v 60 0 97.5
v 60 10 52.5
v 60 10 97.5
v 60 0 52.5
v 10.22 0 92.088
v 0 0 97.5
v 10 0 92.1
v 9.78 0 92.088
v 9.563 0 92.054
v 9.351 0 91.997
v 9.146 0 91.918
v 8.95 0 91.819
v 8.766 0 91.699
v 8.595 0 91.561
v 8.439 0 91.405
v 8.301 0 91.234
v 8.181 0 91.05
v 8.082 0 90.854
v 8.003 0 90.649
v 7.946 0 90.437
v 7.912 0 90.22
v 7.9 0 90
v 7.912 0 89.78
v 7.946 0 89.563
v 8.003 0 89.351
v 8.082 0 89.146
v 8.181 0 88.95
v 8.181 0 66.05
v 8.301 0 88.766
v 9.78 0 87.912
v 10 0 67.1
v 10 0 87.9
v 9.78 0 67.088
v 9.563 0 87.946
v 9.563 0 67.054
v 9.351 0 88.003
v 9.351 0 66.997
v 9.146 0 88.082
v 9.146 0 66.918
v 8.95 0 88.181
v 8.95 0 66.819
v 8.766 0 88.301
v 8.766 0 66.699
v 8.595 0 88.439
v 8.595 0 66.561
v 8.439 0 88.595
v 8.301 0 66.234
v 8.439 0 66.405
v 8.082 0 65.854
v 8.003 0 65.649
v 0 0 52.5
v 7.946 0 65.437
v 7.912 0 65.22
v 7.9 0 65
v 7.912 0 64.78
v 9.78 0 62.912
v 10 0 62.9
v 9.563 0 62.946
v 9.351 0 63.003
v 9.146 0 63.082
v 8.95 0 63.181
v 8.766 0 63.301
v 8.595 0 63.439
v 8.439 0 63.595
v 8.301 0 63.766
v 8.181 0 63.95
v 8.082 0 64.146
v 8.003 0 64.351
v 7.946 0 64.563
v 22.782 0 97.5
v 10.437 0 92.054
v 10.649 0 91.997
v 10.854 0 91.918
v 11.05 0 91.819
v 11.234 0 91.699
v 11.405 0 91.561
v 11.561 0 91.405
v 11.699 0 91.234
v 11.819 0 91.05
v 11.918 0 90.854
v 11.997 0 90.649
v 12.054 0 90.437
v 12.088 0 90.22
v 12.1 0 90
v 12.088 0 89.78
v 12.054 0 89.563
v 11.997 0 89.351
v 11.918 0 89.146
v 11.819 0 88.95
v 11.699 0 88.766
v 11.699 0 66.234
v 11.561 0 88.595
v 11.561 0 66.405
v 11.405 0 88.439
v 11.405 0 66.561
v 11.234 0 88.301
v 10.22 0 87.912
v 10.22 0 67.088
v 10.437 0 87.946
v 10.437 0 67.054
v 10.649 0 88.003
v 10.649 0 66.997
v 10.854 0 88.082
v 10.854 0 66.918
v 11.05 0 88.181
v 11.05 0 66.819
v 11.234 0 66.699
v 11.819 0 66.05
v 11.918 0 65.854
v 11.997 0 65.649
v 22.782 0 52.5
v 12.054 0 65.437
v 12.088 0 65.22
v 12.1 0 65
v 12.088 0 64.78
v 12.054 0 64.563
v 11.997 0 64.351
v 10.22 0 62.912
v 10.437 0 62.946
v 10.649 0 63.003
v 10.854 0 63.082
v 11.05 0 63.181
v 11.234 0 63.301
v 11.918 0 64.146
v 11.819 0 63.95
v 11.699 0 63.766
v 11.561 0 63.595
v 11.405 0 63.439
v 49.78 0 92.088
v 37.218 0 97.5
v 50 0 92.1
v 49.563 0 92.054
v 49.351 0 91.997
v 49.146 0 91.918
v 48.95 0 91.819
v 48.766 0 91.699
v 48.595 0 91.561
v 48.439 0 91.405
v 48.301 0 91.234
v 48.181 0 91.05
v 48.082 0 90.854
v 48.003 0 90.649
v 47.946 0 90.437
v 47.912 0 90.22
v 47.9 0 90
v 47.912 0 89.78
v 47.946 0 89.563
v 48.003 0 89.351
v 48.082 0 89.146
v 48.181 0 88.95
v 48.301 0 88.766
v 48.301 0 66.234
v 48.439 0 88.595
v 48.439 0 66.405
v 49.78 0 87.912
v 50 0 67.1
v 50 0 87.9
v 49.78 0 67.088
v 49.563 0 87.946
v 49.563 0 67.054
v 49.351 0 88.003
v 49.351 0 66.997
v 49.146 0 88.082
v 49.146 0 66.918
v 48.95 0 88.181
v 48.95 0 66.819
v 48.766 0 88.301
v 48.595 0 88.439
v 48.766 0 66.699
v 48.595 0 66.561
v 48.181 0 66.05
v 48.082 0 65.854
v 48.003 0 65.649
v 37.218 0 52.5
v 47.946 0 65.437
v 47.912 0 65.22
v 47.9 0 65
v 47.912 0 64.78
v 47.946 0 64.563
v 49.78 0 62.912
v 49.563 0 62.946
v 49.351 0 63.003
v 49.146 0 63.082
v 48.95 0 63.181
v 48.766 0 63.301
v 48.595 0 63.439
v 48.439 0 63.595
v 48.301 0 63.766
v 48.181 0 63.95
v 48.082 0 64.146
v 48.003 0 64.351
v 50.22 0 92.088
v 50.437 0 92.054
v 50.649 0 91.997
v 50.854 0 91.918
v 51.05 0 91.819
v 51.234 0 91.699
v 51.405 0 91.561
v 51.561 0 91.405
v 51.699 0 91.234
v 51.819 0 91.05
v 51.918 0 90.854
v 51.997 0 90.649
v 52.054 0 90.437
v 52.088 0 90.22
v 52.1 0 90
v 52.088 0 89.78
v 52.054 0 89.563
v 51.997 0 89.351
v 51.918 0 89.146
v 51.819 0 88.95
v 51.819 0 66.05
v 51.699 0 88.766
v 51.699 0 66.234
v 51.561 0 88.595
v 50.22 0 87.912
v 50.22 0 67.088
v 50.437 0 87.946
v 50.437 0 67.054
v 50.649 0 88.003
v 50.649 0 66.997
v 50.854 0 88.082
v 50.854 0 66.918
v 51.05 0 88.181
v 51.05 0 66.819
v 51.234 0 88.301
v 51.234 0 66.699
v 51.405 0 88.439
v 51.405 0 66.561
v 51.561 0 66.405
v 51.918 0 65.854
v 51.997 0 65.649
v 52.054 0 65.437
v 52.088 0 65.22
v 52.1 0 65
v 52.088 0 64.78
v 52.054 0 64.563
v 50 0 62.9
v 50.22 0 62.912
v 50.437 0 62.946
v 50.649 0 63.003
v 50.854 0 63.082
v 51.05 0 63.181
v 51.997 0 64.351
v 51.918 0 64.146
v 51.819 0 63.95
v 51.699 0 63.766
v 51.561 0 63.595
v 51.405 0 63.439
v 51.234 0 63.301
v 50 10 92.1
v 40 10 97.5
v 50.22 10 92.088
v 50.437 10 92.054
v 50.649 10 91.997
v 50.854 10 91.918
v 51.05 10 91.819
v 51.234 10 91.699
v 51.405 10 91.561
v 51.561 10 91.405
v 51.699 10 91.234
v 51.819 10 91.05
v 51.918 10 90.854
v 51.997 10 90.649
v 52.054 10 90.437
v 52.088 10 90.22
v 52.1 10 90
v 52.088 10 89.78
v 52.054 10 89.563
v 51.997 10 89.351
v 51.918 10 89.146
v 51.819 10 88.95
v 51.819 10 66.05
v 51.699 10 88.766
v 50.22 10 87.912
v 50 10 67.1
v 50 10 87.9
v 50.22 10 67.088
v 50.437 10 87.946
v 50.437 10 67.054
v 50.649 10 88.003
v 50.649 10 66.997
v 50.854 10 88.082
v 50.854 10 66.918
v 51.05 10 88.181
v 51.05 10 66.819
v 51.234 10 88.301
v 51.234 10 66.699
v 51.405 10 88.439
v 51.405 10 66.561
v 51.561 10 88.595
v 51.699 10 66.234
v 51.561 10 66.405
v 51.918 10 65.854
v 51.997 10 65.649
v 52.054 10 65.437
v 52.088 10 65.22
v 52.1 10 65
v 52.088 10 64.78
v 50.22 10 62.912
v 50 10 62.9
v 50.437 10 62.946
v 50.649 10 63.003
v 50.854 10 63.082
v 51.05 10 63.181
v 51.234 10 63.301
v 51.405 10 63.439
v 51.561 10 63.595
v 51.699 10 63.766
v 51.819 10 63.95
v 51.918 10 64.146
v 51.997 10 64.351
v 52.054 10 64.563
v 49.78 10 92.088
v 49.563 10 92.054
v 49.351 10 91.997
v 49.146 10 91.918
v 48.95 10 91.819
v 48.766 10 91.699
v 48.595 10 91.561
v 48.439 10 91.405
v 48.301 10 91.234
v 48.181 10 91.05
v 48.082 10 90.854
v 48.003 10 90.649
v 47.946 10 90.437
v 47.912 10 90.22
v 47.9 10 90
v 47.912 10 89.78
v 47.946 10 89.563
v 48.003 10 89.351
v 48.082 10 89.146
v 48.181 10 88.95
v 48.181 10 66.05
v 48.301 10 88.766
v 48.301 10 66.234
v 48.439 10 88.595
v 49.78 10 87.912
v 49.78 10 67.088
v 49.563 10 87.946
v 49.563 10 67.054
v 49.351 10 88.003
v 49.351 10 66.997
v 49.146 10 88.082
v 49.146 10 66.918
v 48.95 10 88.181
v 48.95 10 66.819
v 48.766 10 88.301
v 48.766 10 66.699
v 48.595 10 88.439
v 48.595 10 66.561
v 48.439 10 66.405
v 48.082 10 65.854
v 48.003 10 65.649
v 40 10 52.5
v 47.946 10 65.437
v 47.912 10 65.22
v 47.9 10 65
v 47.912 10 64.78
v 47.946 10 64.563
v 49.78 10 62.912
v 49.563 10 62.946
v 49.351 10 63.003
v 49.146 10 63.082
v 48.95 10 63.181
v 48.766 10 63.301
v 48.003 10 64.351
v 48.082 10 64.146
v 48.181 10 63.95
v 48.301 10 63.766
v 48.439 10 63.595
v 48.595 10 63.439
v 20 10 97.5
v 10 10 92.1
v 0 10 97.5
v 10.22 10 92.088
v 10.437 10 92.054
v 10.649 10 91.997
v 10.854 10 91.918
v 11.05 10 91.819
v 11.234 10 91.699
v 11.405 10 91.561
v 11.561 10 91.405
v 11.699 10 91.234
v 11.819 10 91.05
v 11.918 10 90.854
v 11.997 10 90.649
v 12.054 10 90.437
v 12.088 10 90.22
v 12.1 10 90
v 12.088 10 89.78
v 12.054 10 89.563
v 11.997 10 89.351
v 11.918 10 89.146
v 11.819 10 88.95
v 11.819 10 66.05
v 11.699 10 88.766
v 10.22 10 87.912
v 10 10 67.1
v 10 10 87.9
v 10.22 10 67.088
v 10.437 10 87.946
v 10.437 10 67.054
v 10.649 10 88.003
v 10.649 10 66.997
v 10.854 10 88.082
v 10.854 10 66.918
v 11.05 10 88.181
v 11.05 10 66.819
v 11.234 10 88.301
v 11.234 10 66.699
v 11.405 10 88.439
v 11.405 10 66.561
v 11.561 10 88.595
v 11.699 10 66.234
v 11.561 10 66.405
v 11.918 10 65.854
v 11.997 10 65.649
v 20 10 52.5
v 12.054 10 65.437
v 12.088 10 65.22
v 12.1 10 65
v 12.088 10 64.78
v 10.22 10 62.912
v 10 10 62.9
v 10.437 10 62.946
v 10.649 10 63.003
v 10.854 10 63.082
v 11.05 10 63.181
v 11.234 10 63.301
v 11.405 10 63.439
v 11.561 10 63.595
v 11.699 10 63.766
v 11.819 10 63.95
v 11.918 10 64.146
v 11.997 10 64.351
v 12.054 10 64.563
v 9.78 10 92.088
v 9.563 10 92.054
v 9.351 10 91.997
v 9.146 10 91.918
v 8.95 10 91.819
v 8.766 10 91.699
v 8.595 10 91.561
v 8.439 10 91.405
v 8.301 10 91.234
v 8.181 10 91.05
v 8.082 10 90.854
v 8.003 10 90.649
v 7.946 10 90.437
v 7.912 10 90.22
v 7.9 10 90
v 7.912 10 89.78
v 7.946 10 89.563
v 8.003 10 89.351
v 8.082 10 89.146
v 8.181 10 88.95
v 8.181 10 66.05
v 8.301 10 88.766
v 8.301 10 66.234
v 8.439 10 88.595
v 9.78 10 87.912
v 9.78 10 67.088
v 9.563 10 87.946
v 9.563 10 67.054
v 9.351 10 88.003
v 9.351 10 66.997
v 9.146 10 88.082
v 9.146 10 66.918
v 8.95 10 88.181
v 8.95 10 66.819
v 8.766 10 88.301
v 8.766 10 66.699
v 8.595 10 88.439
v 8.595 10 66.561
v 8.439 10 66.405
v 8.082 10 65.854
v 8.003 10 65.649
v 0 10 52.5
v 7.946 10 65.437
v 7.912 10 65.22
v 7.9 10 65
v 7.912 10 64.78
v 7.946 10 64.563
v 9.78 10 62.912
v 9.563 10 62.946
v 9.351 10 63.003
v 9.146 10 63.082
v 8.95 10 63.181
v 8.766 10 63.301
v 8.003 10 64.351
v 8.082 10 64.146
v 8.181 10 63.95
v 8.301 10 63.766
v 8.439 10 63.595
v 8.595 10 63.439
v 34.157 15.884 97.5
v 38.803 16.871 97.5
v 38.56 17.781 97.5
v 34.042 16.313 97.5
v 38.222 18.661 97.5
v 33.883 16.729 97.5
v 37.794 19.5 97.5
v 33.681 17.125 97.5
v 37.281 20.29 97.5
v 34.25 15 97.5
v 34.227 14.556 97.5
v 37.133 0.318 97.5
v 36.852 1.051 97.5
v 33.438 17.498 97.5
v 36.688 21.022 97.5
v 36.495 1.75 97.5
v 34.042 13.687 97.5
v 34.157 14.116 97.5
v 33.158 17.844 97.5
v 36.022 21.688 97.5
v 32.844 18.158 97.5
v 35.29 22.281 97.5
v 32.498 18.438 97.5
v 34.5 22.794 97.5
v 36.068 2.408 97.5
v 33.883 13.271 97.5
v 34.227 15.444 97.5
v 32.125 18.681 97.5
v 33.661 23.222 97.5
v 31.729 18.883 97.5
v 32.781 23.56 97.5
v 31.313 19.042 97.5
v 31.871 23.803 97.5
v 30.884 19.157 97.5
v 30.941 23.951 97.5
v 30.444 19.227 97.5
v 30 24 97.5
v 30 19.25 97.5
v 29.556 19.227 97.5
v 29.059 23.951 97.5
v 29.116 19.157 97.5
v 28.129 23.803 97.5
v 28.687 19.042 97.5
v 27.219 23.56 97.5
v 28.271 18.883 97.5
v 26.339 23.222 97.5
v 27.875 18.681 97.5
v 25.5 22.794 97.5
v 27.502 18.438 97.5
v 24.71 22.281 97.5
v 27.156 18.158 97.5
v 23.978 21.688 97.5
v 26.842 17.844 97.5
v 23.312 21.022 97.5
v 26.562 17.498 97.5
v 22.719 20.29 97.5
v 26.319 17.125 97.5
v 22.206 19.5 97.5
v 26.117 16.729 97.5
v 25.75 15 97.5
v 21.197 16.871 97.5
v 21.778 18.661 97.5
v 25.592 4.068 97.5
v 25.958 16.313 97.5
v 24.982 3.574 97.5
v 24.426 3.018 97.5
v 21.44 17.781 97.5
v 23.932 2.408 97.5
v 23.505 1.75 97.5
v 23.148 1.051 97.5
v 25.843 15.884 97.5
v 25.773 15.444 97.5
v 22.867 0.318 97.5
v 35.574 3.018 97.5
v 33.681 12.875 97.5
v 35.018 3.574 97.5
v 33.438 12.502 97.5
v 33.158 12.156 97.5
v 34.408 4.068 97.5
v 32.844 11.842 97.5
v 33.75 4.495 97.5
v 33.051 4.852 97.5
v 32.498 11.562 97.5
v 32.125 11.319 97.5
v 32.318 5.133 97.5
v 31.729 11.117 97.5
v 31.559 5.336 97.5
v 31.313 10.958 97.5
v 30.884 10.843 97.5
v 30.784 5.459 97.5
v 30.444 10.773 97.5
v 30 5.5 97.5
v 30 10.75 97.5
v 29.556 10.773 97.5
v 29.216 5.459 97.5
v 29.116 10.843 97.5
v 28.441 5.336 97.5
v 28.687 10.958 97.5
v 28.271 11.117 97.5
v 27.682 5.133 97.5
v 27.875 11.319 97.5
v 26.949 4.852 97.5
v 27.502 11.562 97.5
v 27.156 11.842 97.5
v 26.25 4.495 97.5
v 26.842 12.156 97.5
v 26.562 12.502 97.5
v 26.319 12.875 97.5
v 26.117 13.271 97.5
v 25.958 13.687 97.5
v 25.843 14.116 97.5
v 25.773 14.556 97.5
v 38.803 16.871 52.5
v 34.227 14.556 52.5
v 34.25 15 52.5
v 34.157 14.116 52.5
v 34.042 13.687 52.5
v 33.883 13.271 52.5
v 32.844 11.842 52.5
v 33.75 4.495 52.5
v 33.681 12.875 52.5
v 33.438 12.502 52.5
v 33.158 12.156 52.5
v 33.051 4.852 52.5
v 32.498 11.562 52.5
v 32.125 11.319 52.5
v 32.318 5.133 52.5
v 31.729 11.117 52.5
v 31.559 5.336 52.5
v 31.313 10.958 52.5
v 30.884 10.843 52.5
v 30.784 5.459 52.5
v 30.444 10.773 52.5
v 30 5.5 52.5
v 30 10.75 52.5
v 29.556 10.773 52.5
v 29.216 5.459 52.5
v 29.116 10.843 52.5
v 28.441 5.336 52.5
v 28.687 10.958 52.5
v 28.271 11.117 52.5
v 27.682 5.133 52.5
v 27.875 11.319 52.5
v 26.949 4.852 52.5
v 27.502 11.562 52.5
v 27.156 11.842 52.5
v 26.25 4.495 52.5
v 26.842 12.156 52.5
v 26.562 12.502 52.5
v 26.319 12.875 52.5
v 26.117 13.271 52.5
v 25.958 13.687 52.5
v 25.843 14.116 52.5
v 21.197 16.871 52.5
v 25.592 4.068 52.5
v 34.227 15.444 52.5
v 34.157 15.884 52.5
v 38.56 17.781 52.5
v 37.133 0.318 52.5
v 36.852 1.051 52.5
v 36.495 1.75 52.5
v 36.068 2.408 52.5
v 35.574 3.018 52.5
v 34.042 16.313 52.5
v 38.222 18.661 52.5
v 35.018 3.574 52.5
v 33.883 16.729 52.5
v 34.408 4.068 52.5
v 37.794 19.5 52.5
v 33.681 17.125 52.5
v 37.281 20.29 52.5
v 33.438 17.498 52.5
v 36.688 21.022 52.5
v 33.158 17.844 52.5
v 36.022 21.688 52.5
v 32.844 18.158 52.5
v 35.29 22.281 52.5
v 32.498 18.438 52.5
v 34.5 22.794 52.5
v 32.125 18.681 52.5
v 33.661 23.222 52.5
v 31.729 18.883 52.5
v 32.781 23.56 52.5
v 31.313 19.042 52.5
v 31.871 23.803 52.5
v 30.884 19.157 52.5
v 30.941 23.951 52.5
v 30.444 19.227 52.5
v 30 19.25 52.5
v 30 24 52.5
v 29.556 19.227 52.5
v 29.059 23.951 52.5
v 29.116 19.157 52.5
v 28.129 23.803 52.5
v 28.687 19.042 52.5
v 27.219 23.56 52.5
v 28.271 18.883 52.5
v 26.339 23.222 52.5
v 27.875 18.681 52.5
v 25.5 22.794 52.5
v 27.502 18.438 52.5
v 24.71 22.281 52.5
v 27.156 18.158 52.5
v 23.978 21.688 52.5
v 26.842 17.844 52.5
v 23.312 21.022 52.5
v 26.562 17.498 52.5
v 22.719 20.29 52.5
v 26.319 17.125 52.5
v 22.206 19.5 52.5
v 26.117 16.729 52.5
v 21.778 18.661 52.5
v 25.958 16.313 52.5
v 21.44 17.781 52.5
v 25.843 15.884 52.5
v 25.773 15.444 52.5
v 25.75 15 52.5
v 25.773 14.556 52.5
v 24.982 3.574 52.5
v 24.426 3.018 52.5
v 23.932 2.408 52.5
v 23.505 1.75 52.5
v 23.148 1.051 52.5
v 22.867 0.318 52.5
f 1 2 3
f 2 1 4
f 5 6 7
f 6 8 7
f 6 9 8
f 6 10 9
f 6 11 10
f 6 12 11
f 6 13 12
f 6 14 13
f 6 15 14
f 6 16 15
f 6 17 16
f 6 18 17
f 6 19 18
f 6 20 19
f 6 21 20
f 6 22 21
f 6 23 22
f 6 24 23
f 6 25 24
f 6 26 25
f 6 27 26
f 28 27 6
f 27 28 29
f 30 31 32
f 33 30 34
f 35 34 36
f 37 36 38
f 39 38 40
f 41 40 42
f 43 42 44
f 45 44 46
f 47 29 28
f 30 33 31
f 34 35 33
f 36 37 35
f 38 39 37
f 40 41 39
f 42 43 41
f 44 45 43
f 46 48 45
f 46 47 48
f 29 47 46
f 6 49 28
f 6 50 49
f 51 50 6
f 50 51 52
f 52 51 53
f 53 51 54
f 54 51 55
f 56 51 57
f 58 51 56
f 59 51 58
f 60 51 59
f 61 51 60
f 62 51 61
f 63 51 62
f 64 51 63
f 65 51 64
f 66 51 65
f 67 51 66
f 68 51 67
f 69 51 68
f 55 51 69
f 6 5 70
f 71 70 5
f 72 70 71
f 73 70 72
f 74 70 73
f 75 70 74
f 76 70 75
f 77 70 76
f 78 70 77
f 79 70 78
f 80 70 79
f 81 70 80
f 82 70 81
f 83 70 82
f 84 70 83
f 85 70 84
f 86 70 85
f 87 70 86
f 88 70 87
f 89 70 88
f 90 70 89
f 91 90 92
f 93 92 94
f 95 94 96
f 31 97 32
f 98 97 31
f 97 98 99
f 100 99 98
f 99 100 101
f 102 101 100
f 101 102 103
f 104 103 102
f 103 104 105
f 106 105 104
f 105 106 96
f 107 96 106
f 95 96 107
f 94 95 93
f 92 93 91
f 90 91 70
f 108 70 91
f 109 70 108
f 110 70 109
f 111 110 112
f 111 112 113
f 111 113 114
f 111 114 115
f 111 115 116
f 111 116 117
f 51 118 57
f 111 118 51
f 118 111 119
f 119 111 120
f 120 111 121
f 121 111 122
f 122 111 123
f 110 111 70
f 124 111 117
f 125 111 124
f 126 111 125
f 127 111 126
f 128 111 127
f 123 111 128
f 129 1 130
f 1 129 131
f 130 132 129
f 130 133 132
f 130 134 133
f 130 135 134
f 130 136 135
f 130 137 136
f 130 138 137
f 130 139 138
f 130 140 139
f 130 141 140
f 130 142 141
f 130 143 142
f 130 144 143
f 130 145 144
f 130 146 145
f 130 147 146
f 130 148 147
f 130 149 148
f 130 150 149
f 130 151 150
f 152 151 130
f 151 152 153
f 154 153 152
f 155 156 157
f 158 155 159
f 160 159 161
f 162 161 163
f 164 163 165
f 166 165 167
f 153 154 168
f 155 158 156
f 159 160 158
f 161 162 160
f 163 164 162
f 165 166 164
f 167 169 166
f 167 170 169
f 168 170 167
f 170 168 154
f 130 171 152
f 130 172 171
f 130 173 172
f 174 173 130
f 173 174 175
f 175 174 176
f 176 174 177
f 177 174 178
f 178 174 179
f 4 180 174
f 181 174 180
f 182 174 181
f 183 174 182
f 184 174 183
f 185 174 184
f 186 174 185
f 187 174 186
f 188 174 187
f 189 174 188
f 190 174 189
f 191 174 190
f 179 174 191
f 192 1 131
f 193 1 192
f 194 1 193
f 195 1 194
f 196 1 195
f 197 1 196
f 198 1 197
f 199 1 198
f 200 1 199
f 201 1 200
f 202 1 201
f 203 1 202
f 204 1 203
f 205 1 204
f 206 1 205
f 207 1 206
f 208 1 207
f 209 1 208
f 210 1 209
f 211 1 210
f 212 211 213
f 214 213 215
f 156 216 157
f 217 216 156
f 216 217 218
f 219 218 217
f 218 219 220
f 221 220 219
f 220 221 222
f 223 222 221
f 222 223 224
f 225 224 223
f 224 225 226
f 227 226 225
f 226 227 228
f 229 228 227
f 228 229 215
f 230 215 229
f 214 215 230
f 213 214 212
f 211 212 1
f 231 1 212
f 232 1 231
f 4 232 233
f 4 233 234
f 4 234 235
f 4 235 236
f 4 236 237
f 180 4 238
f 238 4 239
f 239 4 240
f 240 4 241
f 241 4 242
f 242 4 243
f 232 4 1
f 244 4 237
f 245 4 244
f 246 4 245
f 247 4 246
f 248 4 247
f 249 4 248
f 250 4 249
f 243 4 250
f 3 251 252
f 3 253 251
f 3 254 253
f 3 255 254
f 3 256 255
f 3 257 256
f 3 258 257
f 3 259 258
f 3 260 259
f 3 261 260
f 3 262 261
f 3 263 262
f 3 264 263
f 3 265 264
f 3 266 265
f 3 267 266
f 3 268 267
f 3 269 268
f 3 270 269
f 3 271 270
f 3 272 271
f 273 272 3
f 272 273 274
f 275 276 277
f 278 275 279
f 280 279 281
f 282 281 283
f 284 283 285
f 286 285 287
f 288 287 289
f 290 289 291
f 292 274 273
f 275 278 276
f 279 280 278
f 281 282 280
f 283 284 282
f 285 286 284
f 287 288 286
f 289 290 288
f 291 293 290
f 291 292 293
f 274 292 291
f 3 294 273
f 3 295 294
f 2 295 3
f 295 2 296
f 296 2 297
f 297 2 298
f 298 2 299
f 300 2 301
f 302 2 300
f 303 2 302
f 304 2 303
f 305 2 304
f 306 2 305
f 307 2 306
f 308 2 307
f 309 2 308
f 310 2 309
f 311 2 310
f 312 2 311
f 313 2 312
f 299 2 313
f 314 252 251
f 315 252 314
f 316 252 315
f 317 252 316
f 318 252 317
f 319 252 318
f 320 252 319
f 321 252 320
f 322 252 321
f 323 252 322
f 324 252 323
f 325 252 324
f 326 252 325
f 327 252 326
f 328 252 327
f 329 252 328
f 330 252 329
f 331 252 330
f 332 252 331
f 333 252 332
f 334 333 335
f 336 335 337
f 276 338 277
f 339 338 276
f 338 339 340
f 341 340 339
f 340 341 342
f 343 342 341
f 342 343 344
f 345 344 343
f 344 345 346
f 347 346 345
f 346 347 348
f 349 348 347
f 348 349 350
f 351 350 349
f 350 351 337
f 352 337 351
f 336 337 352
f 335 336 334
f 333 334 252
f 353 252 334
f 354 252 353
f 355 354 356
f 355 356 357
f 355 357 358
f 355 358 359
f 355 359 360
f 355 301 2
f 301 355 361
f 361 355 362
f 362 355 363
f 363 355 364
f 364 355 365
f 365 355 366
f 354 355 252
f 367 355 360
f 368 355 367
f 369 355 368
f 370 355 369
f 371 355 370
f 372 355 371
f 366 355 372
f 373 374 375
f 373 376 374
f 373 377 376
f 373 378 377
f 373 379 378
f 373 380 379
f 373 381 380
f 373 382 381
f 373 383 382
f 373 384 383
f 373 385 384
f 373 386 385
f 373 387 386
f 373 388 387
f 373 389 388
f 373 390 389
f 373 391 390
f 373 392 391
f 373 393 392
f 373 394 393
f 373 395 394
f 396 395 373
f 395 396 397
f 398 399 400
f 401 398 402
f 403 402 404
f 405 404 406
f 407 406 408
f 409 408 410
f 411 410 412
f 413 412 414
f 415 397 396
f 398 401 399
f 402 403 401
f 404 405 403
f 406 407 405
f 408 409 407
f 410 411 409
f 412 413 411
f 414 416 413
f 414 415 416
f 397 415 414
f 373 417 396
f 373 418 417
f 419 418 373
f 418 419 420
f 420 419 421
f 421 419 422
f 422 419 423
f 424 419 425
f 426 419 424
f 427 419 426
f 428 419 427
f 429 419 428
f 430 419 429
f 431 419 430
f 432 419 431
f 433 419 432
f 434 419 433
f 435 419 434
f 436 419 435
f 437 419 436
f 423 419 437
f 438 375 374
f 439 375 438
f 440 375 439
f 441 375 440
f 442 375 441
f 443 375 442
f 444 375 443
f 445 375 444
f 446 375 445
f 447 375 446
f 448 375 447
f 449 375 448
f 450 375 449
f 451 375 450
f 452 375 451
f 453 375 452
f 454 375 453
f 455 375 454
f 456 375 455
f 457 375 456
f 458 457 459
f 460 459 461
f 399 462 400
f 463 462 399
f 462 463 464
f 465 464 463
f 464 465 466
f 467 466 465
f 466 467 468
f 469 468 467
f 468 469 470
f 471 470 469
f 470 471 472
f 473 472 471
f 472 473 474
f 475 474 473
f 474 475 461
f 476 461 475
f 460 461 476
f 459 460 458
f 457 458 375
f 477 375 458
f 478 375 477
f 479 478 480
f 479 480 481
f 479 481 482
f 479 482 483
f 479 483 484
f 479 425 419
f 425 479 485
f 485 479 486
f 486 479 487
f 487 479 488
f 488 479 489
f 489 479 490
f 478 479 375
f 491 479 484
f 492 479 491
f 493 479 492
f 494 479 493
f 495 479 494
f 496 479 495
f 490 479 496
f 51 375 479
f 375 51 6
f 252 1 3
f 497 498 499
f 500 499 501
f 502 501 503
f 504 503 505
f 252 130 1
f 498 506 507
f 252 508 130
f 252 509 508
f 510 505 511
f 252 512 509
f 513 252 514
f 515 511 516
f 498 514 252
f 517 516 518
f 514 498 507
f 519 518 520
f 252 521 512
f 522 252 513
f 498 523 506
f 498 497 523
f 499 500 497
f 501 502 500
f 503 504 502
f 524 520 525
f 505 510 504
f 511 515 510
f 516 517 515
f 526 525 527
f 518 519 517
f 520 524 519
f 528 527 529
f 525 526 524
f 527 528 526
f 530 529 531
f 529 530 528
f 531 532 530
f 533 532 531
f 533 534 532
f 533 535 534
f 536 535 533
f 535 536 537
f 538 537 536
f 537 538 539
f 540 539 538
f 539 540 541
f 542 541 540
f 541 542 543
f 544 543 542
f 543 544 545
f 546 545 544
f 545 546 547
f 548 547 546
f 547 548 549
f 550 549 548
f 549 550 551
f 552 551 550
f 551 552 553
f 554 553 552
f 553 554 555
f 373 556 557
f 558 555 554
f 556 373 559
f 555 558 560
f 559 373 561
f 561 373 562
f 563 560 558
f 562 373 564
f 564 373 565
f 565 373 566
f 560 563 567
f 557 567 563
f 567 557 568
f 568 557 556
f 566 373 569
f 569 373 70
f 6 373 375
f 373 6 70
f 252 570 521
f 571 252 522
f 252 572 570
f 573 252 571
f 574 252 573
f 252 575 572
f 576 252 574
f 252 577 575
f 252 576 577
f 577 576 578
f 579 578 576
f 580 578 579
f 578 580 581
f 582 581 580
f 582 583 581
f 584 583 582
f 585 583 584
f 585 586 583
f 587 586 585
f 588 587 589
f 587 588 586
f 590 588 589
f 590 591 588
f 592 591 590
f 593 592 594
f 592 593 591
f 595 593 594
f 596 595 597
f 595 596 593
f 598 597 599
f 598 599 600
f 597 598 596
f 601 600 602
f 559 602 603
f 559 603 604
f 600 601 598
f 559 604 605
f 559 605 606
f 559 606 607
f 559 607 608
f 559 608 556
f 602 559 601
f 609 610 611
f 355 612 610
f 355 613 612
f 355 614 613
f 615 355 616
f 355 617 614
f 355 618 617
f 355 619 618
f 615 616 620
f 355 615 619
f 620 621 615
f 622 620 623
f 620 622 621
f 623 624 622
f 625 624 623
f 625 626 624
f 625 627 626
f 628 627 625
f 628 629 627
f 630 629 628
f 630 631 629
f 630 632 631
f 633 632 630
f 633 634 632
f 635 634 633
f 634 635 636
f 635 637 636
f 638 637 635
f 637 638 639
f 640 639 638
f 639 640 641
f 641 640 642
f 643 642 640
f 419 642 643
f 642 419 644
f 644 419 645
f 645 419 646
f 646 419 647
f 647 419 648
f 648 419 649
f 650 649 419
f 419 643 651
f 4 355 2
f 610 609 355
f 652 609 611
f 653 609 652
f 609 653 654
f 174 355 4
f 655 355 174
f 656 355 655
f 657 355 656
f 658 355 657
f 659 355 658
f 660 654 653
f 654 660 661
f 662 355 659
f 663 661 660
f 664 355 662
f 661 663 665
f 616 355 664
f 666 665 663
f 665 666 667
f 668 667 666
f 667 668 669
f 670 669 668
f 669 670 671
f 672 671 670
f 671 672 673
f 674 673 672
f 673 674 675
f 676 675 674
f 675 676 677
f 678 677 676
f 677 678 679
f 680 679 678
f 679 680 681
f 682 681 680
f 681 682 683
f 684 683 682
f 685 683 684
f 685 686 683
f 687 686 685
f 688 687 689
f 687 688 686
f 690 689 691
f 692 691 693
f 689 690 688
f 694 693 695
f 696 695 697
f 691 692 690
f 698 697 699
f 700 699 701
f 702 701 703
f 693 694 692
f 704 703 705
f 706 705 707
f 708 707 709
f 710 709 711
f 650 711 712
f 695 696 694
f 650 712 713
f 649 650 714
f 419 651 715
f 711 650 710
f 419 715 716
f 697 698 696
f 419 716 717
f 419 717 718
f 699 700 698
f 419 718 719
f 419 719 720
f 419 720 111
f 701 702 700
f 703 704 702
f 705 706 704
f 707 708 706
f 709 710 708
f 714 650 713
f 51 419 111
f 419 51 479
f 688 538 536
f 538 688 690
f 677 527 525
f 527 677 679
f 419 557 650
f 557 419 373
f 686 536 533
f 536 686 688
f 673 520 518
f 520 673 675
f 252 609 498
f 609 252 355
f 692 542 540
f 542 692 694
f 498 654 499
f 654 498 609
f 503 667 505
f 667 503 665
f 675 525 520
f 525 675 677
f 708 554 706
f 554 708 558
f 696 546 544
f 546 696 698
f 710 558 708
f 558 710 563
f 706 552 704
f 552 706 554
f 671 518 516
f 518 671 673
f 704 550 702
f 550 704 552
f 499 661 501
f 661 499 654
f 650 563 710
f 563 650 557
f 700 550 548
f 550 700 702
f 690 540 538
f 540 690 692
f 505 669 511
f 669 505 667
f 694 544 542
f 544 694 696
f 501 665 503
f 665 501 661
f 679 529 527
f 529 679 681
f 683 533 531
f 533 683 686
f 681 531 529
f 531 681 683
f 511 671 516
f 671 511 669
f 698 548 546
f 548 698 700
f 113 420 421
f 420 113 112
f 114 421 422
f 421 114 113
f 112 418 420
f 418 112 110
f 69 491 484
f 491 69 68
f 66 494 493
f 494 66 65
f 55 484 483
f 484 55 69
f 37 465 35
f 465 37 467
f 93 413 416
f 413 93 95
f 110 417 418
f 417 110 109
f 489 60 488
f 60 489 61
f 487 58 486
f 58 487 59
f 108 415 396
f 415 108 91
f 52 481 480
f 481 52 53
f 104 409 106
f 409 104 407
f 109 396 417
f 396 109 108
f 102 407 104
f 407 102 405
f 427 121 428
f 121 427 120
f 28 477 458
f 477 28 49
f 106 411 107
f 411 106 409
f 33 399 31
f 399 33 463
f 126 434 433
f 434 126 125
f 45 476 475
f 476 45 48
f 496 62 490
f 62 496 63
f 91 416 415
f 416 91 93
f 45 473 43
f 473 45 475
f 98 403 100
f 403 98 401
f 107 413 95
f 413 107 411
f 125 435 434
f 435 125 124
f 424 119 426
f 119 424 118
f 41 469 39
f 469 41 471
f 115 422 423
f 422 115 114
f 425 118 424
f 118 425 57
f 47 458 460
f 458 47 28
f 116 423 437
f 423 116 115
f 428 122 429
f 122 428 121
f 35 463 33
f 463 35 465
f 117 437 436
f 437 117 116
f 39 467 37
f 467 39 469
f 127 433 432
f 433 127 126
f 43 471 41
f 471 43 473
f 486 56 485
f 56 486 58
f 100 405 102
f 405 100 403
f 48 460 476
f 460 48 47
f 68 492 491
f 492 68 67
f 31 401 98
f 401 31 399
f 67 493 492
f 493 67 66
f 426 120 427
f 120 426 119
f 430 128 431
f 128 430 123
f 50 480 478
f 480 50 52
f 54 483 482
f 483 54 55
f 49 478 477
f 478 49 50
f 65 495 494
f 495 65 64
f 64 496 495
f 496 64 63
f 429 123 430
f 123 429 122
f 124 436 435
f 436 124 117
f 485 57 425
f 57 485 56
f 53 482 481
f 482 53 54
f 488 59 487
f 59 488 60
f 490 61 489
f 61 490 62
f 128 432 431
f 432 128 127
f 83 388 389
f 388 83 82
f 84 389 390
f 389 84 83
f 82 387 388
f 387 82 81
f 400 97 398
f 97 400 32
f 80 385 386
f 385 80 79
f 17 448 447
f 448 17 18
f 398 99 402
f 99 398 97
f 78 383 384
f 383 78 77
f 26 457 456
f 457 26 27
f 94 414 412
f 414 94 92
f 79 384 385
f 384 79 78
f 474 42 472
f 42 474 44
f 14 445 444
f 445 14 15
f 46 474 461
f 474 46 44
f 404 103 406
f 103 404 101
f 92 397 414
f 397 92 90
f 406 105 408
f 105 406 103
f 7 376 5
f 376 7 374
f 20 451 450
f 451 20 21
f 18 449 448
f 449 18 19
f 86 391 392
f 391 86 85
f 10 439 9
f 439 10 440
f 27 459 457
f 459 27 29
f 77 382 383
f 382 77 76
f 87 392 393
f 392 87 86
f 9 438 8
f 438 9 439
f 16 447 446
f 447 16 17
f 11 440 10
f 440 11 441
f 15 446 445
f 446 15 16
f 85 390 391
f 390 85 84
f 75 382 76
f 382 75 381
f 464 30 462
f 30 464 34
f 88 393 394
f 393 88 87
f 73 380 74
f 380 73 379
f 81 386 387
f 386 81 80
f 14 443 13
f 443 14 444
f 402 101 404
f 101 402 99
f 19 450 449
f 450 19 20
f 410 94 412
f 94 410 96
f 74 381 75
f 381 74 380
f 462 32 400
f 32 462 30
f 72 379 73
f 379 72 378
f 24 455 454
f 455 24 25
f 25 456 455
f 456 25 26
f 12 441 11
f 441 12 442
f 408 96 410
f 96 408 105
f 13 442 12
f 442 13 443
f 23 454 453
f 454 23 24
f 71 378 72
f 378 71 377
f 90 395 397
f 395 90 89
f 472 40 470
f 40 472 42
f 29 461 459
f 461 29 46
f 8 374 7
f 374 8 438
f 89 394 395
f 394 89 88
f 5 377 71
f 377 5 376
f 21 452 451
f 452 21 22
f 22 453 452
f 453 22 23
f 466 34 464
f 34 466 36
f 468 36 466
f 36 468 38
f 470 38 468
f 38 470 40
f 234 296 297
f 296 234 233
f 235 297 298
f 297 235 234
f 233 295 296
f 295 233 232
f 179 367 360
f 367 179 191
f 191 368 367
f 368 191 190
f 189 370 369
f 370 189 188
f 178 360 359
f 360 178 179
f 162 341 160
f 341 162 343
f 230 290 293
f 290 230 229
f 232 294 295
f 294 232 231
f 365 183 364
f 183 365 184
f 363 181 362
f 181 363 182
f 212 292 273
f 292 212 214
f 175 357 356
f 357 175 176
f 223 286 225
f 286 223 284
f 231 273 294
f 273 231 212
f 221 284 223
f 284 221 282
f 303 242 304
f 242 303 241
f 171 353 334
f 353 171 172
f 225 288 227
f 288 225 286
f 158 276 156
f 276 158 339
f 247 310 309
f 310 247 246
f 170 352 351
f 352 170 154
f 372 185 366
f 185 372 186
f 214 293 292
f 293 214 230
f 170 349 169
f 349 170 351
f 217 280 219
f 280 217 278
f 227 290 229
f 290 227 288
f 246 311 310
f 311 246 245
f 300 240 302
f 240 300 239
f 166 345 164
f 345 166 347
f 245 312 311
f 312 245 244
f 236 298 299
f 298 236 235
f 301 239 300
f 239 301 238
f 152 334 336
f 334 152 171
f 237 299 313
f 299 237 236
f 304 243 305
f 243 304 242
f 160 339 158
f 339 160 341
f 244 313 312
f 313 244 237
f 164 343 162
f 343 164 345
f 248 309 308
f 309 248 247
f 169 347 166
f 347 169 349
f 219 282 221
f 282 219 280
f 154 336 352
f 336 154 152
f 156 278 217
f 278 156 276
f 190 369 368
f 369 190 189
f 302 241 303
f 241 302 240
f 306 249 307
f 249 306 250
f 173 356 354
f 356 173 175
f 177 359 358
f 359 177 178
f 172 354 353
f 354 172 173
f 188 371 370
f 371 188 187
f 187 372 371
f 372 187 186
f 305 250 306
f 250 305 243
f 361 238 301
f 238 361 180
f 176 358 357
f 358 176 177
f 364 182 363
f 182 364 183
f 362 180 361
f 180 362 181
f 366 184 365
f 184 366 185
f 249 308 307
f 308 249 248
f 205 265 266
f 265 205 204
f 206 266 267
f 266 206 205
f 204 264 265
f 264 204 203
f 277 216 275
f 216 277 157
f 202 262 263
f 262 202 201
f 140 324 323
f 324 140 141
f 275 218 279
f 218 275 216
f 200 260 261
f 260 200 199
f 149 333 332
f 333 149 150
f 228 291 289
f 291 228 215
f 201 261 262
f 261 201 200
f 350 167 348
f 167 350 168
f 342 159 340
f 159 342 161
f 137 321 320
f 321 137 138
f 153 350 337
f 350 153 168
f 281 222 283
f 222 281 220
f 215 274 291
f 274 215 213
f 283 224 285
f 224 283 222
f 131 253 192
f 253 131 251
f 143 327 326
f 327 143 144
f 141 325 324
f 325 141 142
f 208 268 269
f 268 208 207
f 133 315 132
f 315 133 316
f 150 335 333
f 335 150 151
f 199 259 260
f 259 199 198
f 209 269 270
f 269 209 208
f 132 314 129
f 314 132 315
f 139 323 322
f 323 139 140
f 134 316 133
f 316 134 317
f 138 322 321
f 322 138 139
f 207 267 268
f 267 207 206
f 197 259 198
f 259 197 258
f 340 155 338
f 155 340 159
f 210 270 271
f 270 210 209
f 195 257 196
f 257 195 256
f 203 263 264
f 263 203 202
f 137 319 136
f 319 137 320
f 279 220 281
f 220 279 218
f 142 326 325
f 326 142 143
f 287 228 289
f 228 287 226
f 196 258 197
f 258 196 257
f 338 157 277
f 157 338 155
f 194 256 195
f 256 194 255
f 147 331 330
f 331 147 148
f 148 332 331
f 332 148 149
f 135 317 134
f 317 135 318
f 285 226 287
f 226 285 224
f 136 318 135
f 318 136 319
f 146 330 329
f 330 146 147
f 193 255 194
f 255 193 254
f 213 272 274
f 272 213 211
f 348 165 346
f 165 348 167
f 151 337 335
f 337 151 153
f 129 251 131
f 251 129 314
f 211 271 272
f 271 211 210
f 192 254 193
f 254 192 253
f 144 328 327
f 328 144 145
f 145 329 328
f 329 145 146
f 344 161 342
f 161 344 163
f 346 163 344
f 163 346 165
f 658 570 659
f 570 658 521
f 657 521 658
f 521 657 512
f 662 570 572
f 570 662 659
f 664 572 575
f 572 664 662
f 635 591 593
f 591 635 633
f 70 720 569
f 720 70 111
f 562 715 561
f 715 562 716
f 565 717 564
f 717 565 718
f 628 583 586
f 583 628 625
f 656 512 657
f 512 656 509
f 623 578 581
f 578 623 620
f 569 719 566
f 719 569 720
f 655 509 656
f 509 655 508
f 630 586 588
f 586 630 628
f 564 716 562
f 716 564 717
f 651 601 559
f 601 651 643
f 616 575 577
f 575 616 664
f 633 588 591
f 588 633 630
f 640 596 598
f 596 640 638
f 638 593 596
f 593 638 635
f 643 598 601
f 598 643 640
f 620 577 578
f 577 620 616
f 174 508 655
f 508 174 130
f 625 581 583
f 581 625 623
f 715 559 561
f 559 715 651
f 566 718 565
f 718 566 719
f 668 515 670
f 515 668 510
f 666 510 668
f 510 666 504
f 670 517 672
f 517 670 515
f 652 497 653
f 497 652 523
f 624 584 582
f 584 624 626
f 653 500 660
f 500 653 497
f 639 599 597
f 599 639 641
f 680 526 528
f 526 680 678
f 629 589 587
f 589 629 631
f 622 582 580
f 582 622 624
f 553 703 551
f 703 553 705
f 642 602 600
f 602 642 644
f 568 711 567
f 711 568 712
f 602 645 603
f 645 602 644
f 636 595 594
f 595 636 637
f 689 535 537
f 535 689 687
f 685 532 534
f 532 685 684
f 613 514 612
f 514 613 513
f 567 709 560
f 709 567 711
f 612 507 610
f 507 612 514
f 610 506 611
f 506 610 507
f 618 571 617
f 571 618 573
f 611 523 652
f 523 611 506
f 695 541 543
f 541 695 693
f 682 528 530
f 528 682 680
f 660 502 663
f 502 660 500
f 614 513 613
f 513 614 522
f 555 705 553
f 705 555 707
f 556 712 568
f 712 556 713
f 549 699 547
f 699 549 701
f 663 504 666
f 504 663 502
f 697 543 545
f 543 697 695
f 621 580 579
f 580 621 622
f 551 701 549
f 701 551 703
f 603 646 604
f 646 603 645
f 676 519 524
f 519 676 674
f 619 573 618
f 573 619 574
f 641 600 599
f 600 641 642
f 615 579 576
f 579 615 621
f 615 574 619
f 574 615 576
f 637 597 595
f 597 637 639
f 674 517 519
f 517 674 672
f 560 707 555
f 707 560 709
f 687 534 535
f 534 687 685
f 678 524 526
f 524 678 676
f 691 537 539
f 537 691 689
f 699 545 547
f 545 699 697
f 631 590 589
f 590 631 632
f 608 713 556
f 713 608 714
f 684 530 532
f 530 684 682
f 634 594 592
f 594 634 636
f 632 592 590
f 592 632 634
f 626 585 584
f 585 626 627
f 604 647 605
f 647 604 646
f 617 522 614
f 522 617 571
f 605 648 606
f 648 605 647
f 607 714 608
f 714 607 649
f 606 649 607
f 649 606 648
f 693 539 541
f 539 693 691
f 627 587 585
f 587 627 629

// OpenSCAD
$fn=60;

rotate([90,0,0]) {

*translate([30,60,4])
	color([0,0,0])
		sphere(r=6);
*translate([30,90,4])
	color([0,0,0])
		sphere(r=6);

*difference() {
	cube([60, 140, 4]);
	for(x=[10,30,50]) {
		translate([
			x,
			65,
			-.1
		]) {
			cylinder(
				r = 2.625,
				h = 4.2
			);
			translate([
				-2.625,
				0,
				0
			]) {
				cube([
					2.625*2,
					90-65,
					4.2
				]);
			}
			translate([
				0,
				90-65,
				0
			]) {
				cylinder(
					r = 2.625,
					h = 4.2
				);
			}
		}
	}
}



difference() {

	union() {
		translate([0,52.5,-10])
			cube([60, 45, 10]);

		hull() {

			translate([20,52.5,-10])
				cube([20, 45, 10]);
			translate([30,52.5,-15])
				rotate([-90,180/6,0])
					cylinder(
						r=9,
						h=45
					);
		}
	}

	translate([30,0,2])
		rotate([-90,180/6,0])
			cylinder(
				d=15,
				h=100
			);


	for(x=[10,50]) {
		translate([
			x,
			65,
			-60
		]) {
			cylinder(
				d=4.2, //M5 Tap
				h = 100
			);
			translate([
				0,
				90-65,
				0
			]) {
				cylinder(
				d=4.2, //M5 Tap
					h = 100
				);
			}
		}
	}

	translate([30,0,-15])
		rotate([-90,180/6,0])
			cylinder(
				d=8.5, //M10 tap
				h=100
			);
}

}
